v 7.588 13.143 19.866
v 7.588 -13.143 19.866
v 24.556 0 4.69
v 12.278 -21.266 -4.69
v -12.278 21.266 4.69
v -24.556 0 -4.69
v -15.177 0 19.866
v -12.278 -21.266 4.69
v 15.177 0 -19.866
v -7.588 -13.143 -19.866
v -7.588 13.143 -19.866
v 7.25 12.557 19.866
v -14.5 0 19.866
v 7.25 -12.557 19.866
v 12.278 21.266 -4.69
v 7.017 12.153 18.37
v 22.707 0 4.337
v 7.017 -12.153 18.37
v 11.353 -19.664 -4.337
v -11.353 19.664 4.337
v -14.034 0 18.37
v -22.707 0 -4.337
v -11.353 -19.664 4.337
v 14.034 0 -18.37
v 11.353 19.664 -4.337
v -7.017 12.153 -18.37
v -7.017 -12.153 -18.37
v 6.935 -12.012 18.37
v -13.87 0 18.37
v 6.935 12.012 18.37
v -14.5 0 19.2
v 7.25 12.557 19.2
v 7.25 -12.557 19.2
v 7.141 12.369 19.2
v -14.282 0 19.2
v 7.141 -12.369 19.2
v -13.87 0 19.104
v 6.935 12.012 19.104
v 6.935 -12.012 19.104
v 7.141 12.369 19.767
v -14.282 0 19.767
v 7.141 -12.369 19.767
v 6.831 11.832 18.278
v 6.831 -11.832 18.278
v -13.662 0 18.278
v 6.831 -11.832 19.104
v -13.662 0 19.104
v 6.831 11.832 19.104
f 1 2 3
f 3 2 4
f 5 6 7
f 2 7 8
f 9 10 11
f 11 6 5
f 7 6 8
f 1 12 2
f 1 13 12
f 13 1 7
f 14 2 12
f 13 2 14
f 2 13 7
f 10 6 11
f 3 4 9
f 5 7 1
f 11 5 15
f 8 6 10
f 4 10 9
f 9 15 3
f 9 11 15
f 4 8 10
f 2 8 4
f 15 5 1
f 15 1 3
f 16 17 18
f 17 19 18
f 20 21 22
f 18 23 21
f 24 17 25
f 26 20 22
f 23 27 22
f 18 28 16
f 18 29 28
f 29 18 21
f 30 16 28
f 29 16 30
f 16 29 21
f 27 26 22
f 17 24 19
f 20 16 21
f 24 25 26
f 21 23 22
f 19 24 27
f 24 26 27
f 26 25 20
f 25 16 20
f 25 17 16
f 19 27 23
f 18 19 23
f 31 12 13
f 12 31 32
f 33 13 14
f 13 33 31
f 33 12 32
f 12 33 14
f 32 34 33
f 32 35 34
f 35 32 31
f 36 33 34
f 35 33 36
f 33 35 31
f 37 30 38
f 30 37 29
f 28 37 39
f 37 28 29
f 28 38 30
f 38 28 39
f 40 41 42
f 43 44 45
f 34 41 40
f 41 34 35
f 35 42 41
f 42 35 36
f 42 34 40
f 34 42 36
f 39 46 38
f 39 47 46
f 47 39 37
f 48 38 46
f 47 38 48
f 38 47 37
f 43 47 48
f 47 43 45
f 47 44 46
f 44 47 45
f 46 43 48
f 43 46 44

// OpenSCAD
angle = 20.905;
externalRadius = 25;
internalRdius = 23.117; // Pour épaisseur paroi 1.5 mm
diametreTrouBouchon = 1.5;
echelleReductionAjustementBouchon = 0.985;
r = 0.19; // résolution d'impression sur l'axe Z

//ico_creux();
//decoupe_bouchon();
corps_ouvert();
bouchon();
//trou();

module corps_ouvert() {
    //rotate([180, 0, 0])
	difference() {
		ico_creux();
		decoupe_bouchon();
	}
}

module bouchon() {
	scale([echelleReductionAjustementBouchon, echelleReductionAjustementBouchon, 0.995])
	difference () {
        intersection() {
            ico_creux();
            decoupe_bouchon(echelleReductionAjustementBouchon);
        }
	}
}
module bouchon_trou(version) {
	scale([echelleReductionAjustementBouchon, echelleReductionAjustementBouchon, 0.98])
	difference () {
        intersection() {
            ico_creux();
            decoupe_bouchon(echelleReductionAjustementBouchon);
        }
        trou();
        // trou centre face
//		translate([0, 0, externalRadius*0.5])
//		cylinder(30, r=diametreTrouBouchon/2, $fn=22);
	}
}

module trou() {
    rotate([0, -37.3, 0])
		translate([0, 0, externalRadius*0.5])
		cylinder(30, r=diametreTrouBouchon/2, $fn=22);
}

module ico_creux() {
	difference() {
        rotate([0, angle, 0]) icosahedron(externalRadius);
        rotate([0, angle, 0]) icosahedron(internalRdius);
	}
}

module decoupe_bouchon(scale=1) {
	rotate([0,0,60]) translate([0,0,externalRadius*0.73+5*r])
		cylinder(6*r, r=externalRadius*0.58, $fn=3);
	rotate([0,0,60]) translate([0,0,externalRadius*0.73])
		cylinder(6*r, r=internalRdius*0.6, $fn=3);
}

module icosahedron(rad=1) {
	Cphi = (1+sqrt(5))/2;

	// Convert spherical to cartesian
	function sph_to_cart(c, rad) = [
		rad*sin(atan2(sqrt(c[0]*c[0]+c[1]*c[1]), c[2]))*cos(atan2(c[1],c[0])),  
		rad*sin(atan2(sqrt(c[0]*c[0]+c[1]*c[1]), c[2]))*sin(atan2(c[1],c[0])),
		rad*cos(atan2(sqrt(c[0]*c[0]+c[1]*c[1]), c[2]))
		];


	//================================================
	//	Icosahedron
	//================================================
	//
	// (0, +-1, +-Cphi)
	// (+-Cphi, 0, +-1)
	// (+-1, +-Cphi, 0)

	function icosa_unit(rad) = [
		sph_to_cart([0, +1, +Cphi], rad), 
		sph_to_cart([0, +1, -Cphi], rad),
		sph_to_cart([0, -1, -Cphi], rad),
		sph_to_cart([0, -1, +Cphi], rad),
		sph_to_cart([+Cphi, 0, +1], rad), 
		sph_to_cart([+Cphi, 0, -1], rad), 
		sph_to_cart([-Cphi, 0, -1], rad),
		sph_to_cart([-Cphi, 0, +1], rad),
		sph_to_cart([+1, +Cphi, 0], rad),
		sph_to_cart([+1, -Cphi, 0], rad), 
		sph_to_cart([-1, -Cphi, 0], rad), 
		sph_to_cart([-1, +Cphi, 0], rad),
		];

	icosa_faces = [ 
		[3,0,4],
		[3,4,9],
		[3,9,10],
		[3,10,7],
		[3,7,0],
		[0,8,4],
		[0,7,11],
		[0,11,8],
		[4,8,5],
		[4,5,9],
		[7,10,6],
		[7,6,11],
		[9,5,2],
		[9,2,10],
		[2,6,10],
		[1,5,8],
		[1,8,11],
		[1,11,6],
		[5,1,2],
		[2,1,6]
		];

	polyhedron(icosa_unit(rad), faces = icosa_faces);
}
